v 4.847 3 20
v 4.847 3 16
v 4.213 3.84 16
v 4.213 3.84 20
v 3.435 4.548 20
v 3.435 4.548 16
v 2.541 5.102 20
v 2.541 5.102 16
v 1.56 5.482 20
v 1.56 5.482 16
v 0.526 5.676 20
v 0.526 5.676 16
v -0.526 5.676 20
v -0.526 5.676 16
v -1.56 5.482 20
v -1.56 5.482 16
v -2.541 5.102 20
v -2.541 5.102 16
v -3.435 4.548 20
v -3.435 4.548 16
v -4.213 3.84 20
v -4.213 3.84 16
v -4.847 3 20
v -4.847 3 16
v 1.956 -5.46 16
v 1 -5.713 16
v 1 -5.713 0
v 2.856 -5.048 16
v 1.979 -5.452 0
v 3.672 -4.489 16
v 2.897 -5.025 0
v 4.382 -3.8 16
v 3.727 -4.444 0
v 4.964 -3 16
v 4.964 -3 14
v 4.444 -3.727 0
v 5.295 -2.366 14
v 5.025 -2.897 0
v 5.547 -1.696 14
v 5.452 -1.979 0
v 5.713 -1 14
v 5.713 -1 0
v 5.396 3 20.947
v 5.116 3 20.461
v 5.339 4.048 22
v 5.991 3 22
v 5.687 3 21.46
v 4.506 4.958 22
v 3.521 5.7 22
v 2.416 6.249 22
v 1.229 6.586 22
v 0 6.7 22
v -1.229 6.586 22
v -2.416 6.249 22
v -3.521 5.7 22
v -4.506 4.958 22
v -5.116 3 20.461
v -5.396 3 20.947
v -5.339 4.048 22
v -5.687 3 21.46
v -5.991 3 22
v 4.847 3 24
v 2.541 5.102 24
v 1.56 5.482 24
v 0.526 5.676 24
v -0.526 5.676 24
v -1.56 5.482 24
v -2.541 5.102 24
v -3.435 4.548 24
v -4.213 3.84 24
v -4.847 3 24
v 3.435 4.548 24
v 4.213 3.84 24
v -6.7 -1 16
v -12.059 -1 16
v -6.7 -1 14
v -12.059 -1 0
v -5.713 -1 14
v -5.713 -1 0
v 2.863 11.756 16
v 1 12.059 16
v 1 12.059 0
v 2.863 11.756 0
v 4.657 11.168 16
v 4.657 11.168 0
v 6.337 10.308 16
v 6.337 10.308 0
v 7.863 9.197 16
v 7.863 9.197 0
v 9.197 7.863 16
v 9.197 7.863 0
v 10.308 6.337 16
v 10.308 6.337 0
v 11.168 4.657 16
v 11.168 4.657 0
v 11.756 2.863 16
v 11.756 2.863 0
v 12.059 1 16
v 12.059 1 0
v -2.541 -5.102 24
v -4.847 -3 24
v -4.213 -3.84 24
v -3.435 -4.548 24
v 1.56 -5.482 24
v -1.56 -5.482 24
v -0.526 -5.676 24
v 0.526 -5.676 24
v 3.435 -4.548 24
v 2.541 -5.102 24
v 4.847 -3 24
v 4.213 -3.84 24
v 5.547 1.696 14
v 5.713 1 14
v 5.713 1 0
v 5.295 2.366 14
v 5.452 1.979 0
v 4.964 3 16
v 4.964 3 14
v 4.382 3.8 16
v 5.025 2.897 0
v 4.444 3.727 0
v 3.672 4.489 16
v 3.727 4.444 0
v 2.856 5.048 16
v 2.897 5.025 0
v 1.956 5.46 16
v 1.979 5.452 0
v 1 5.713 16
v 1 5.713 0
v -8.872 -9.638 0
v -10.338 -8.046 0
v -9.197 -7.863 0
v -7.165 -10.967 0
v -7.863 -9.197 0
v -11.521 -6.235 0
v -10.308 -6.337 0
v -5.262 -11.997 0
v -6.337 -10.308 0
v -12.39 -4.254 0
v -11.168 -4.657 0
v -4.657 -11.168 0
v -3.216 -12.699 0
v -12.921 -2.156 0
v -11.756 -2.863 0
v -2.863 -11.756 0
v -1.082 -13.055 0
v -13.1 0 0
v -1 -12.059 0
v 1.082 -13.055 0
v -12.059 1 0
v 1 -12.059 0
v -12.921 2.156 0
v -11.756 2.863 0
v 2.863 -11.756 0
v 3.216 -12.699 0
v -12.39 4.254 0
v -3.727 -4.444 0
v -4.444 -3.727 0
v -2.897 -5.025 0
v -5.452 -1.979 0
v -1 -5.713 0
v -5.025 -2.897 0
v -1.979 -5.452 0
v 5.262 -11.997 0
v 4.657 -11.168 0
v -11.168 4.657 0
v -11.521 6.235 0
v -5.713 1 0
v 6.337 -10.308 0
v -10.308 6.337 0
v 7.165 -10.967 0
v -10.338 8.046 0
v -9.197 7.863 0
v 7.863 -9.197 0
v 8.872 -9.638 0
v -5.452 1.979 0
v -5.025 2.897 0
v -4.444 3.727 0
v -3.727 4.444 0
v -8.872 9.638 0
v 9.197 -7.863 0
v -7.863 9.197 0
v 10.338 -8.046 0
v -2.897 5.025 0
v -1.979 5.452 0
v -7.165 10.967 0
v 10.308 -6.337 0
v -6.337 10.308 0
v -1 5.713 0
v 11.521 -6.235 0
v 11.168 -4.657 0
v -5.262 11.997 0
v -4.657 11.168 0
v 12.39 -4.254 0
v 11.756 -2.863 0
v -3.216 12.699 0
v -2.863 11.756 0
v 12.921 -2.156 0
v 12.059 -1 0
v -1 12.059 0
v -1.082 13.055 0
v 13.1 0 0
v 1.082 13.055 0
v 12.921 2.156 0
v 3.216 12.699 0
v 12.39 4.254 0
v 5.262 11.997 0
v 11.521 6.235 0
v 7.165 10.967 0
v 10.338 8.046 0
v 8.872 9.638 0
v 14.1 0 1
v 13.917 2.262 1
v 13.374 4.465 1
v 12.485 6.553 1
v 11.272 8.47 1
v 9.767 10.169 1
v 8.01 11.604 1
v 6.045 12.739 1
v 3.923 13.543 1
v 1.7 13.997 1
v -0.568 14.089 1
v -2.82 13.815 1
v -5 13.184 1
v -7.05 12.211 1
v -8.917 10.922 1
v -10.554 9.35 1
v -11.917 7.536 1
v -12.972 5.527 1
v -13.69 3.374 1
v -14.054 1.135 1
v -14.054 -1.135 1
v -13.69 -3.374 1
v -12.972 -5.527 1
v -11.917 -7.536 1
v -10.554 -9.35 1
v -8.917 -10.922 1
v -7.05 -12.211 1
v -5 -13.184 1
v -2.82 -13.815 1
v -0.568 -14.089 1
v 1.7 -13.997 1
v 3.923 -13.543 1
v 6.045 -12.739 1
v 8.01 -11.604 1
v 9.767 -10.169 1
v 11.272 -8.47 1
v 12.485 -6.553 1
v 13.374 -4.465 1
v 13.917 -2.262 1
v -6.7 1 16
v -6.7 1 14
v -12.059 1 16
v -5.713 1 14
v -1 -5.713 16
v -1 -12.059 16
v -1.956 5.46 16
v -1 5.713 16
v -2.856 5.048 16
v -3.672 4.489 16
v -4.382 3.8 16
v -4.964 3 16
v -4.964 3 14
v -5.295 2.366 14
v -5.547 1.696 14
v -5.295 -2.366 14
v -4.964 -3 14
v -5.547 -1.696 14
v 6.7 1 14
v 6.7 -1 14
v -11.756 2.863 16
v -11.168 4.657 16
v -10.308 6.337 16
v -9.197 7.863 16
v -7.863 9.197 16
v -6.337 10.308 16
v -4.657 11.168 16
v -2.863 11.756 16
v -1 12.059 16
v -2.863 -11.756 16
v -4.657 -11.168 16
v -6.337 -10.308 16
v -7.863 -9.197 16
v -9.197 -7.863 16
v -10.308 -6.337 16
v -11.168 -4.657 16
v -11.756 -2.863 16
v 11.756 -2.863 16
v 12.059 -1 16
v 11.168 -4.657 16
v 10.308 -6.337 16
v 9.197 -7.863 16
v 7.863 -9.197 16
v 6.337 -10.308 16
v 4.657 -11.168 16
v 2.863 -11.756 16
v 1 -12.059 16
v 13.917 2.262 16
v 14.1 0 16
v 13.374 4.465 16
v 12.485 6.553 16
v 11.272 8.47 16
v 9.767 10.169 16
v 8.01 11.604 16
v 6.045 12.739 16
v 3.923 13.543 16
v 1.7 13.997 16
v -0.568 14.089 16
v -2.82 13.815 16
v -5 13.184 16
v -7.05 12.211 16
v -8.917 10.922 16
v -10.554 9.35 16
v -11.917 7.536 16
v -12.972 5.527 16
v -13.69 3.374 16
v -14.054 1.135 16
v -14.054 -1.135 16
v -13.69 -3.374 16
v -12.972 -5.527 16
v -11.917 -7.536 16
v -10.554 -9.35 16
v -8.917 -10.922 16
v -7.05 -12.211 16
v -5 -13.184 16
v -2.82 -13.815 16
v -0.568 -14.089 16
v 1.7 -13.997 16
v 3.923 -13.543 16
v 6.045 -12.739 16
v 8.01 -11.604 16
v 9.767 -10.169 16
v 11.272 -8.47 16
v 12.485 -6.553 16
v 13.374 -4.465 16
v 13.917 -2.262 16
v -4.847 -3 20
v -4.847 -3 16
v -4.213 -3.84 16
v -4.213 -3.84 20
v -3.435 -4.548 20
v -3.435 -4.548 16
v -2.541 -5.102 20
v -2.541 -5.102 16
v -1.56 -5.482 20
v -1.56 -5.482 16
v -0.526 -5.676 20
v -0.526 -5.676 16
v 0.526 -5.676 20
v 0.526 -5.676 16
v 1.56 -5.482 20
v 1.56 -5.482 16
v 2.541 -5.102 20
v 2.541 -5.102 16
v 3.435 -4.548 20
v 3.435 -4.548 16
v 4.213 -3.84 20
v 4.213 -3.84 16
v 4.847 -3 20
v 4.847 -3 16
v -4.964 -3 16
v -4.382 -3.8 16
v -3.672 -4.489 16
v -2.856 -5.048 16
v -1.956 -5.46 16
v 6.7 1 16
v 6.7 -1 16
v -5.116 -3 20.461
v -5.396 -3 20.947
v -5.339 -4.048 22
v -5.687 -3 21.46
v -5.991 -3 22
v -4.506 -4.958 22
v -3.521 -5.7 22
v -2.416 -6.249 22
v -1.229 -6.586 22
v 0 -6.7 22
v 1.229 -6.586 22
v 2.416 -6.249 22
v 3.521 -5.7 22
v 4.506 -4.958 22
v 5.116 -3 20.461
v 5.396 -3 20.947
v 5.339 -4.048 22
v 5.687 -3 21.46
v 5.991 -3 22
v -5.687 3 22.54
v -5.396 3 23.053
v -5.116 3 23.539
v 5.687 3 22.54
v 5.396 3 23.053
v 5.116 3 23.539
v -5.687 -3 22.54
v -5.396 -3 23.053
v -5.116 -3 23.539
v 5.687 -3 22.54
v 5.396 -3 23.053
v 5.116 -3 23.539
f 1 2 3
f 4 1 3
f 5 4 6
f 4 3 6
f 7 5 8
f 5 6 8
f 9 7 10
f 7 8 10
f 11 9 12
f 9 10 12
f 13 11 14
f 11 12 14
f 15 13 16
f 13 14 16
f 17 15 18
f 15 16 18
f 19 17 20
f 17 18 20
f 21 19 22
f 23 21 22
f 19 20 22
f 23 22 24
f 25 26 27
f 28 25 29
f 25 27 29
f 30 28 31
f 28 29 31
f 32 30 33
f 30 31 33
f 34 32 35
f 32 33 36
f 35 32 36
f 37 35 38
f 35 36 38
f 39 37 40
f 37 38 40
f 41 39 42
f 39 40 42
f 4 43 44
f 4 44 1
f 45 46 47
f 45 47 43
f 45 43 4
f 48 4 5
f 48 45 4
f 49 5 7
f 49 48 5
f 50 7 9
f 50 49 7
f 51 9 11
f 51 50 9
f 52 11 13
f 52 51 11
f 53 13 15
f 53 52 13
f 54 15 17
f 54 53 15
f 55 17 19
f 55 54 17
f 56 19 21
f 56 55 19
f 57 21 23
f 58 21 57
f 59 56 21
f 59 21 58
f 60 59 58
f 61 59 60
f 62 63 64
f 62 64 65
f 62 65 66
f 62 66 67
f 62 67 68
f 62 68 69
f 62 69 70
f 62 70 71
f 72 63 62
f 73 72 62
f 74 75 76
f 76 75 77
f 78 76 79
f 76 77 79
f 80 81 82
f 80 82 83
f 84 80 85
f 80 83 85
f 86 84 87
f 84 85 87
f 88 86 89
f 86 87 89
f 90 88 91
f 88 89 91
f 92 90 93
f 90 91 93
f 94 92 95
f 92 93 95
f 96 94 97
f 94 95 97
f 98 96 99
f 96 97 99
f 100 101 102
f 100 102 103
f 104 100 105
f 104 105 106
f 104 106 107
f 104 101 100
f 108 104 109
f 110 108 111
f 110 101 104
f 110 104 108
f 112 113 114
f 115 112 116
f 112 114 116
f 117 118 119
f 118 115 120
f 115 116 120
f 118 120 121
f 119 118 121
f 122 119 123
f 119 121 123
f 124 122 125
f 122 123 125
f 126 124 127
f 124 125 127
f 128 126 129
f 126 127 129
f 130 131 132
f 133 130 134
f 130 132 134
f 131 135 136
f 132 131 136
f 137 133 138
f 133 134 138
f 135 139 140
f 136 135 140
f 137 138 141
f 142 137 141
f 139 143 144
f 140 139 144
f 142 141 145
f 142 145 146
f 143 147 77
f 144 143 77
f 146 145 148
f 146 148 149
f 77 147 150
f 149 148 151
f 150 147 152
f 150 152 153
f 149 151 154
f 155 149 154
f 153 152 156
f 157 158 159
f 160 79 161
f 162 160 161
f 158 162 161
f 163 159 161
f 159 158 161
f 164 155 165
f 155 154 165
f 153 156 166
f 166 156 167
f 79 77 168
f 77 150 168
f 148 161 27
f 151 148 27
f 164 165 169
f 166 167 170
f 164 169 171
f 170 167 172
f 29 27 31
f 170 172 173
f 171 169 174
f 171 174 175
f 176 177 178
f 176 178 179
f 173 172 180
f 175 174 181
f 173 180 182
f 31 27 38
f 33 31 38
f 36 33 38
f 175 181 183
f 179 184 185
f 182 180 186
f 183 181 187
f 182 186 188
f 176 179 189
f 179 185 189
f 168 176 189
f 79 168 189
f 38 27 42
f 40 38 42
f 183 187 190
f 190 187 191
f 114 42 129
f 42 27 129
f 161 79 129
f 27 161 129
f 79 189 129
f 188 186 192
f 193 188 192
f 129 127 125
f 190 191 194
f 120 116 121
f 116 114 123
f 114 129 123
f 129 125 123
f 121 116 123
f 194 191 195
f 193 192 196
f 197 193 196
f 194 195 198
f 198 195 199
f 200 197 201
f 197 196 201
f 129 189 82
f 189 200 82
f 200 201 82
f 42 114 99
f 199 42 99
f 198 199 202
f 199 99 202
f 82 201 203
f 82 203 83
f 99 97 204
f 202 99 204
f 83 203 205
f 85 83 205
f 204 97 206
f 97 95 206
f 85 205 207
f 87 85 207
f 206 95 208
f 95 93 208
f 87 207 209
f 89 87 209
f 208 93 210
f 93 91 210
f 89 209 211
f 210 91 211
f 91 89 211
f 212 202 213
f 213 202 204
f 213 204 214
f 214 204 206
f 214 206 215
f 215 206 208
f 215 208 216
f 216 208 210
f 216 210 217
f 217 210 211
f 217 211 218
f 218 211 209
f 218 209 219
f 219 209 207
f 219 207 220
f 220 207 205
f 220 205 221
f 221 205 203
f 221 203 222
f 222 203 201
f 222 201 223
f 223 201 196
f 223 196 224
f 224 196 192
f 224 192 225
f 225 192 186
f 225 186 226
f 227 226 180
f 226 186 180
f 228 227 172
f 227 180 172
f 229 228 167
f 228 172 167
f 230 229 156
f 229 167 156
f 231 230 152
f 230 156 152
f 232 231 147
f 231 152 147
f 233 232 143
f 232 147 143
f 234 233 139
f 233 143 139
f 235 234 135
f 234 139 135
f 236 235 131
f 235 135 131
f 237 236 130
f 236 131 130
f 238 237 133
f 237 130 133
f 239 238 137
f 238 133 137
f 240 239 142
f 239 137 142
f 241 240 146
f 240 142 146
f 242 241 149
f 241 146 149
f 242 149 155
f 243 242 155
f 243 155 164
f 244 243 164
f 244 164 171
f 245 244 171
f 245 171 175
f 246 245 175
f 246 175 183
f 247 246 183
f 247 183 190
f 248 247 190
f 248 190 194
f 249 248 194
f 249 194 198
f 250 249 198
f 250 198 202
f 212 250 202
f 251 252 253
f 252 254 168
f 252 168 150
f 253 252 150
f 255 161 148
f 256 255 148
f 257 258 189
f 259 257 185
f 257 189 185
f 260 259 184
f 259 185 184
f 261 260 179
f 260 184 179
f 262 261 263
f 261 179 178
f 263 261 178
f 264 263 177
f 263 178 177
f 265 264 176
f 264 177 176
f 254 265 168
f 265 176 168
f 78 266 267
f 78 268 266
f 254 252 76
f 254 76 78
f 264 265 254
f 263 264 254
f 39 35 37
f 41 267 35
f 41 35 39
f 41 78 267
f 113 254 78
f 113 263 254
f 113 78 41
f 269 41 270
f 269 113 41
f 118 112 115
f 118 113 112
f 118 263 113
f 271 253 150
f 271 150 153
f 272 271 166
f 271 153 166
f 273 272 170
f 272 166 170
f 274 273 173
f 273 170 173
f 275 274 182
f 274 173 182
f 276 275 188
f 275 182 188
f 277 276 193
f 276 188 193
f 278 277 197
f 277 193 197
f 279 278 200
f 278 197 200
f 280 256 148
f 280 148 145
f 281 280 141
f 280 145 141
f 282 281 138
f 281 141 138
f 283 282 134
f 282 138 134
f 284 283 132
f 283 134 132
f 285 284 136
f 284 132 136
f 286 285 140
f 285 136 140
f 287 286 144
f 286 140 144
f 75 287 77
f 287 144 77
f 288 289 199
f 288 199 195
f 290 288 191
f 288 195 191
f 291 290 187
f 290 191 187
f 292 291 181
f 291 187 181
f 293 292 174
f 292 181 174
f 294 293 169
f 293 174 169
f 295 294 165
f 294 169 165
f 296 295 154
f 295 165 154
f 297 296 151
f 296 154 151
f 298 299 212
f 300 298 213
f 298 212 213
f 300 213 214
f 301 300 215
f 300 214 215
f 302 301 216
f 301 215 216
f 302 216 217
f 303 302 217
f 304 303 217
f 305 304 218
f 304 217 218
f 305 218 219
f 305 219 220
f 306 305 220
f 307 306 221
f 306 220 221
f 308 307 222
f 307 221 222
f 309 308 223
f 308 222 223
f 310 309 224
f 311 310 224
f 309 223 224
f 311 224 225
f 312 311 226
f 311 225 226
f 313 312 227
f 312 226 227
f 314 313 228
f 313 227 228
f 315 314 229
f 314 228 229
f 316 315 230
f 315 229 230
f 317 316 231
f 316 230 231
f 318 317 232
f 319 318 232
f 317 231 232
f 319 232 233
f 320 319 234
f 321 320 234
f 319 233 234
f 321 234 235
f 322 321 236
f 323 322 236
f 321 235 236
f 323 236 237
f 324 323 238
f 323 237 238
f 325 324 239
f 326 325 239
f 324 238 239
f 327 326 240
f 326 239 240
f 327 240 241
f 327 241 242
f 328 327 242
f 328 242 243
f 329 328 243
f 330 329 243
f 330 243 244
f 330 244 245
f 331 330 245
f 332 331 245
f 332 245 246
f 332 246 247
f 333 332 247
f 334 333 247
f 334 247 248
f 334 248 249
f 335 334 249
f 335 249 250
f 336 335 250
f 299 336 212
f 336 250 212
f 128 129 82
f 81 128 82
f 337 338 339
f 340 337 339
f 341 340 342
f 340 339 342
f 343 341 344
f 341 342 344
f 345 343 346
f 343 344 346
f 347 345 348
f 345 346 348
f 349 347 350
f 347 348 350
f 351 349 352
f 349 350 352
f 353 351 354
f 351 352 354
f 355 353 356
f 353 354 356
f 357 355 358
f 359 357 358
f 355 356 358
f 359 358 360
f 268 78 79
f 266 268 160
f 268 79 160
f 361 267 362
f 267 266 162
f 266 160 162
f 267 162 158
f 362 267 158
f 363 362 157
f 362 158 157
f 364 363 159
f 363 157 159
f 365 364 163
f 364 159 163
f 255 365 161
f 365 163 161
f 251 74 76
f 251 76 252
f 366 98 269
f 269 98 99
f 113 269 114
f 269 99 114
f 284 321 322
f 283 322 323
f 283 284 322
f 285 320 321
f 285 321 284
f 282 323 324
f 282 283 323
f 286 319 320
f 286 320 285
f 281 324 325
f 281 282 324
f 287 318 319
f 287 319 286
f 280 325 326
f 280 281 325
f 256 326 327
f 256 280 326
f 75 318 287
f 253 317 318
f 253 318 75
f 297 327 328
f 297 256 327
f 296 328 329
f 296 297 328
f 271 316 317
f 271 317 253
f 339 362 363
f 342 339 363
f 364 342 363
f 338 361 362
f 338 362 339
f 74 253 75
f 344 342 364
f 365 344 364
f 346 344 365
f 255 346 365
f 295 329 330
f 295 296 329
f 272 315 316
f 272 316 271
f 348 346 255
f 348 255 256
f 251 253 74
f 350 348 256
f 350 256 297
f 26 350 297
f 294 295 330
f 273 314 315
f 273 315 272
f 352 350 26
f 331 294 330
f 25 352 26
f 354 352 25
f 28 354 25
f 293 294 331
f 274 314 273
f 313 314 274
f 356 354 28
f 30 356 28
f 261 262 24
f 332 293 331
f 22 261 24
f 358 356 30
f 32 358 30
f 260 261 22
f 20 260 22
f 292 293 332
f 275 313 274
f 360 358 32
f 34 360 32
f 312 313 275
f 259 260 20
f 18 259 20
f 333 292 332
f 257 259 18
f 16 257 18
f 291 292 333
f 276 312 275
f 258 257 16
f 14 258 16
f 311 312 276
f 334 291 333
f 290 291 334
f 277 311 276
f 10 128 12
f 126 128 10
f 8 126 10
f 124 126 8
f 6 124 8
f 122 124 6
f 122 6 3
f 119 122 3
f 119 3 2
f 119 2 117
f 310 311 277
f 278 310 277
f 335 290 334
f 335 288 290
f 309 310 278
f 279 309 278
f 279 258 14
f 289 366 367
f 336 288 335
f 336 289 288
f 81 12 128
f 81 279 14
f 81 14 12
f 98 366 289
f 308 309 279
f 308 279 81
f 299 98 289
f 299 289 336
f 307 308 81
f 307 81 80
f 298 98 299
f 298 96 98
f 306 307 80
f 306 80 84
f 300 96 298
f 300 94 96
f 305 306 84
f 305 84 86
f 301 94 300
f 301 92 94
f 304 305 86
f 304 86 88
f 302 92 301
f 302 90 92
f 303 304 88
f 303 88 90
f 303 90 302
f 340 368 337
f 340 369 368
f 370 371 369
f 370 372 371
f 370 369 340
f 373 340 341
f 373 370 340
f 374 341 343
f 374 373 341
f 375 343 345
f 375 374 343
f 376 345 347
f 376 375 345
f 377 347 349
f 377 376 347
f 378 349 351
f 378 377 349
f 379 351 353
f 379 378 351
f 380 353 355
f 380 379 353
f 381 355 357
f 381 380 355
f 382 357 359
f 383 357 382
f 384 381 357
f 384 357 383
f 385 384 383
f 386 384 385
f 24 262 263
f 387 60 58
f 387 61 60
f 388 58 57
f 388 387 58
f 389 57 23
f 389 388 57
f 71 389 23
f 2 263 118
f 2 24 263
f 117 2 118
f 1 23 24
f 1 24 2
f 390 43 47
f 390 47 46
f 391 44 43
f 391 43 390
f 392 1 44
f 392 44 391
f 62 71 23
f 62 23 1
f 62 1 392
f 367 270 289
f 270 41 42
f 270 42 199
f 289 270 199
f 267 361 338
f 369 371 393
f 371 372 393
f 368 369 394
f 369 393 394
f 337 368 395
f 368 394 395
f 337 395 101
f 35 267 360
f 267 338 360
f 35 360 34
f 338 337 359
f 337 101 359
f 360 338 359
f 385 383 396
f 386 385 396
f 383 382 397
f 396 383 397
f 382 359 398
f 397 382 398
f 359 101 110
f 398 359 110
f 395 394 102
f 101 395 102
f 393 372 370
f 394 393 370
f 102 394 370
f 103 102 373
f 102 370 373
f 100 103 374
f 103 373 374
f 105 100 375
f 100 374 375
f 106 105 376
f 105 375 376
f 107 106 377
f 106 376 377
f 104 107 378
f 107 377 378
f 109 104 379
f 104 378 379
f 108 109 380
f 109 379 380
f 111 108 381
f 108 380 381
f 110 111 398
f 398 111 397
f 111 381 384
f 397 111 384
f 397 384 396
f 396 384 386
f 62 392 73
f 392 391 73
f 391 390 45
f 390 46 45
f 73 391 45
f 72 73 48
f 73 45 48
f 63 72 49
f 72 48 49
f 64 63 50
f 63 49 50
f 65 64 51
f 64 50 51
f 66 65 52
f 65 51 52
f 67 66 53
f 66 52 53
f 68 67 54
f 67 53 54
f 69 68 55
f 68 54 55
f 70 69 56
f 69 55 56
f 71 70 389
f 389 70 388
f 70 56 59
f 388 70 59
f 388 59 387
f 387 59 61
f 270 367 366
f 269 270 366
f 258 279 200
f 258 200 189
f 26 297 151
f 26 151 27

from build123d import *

# Parameters (mm, degrees)
F0_R       = 14.1
F1_DEPTH   = 16
F2_SIZE    = 1
F3_R       = 5.7
F4_DEPTH   = 8
F5_R       = 6.7
F5_R_2     = 5.7
F6_DEPTH   = 4
F7_SIZE2   = 2
F7_SIZE    = 1
F7_2_SIZE2 = 1.99999
F7_2_SIZE  = 0.99999
F8_W       = 13.4
F8_H       = 6
F9_DEPTH   = 10


# Not quite as in the source:
# - a fillet or chamfer is up to 0.001 mm smaller than in the source, because OpenCascade refuses the exact size


with BuildPart() as f1:
    # F0 (on Top) → F1 (new body)
    with BuildSketch(Plane.XY):
        Circle(F0_R)
        with BuildLine():
            Line((-12.0586068847, -1), (-5.7131427428, -1))
            ThreePointArc((-5.7131427428, -1), (-4.1012193309, -4.1012193309), (-1, -5.7131427428))
            Line((-1, -5.7131427428), (-1, -12.0586068847))
            ThreePointArc((-1, -12.0586068847), (-8.5559920524, -8.5559920524), (-12.0586068847, -1))
        make_face(mode=Mode.SUBTRACT)
        with BuildLine():
            ThreePointArc((12.0586068847, -1), (8.5559920524, -8.5559920524), (1, -12.0586068847))
            Line((1, -12.0586068847), (1, -5.7131427428))
            ThreePointArc((1, -5.7131427428), (4.1012193309, -4.1012193309), (5.7131427428, -1))
            Line((5.7131427428, -1), (12.0586068847, -1))
        make_face(mode=Mode.SUBTRACT)
        with BuildLine():
            ThreePointArc((-12.0586068847, 1), (-8.5559920524, 8.5559920524), (-1, 12.0586068847))
            Line((-1, 12.0586068847), (-1, 5.7131427428))
            ThreePointArc((-1, 5.7131427428), (-4.1012193309, 4.1012193309), (-5.7131427428, 1))
            Line((-5.7131427428, 1), (-12.0586068847, 1))
        make_face(mode=Mode.SUBTRACT)
        with BuildLine():
            Line((12.0586068847, 1), (5.7131427428, 1))
            ThreePointArc((5.7131427428, 1), (4.1012193309, 4.1012193309), (1, 5.7131427428))
            Line((1, 5.7131427428), (1, 12.0586068847))
            ThreePointArc((1, 12.0586068847), (8.5559920524, 8.5559920524), (12.0586068847, 1))
        make_face(mode=Mode.SUBTRACT)
    extrude(amount=F1_DEPTH)

    # F2
    f2_edges = [f1.edges().sort_by_distance(p)[0] for p in [
        (-14.1, 0, 0),
    ]]
    chamfer(f2_edges, length=F2_SIZE)

    # F3 (on face) → F4 (join)
    with BuildSketch(Plane.XY.offset(16)):
        Circle(F3_R)
    extrude(amount=F4_DEPTH)

    # F5 (on face) → F6 (join)
    with BuildSketch(Plane.XY.offset(24)):
        Circle(F5_R)
        Circle(F5_R_2, mode=Mode.SUBTRACT)
    extrude(amount=-F6_DEPTH)

    # F7
    f7_edges = [f1.edges().sort_by_distance(p)[0] for p in [
        (-6.7, 0, 24),
    ]]
    f7_side = f1.faces().sort_by_distance((0, 0, 24))[0]
    chamfer(f7_edges, length=F7_SIZE, length2=F7_SIZE2, reference=f7_side)

    # F7#2 (size 1 and 2 in the source; OpenCascade refuses exactly that, so slightly less here)
    f7_2_edges = [f1.edges().sort_by_distance(p)[0] for p in [
        (-6.7, 0, 20),
    ]]
    f7_2_side = f1.faces().sort_by_distance((-6.510495, 0, 20))[0]
    chamfer(f7_2_edges, length=F7_2_SIZE, length2=F7_2_SIZE2, reference=f7_2_side)

    # F8 (on face) → F9 (cut)
    with BuildSketch(Plane.XY.offset(24)):
        Rectangle(F8_W, F8_H)
    extrude(amount=-F9_DEPTH, mode=Mode.SUBTRACT)


solid = f1.part
